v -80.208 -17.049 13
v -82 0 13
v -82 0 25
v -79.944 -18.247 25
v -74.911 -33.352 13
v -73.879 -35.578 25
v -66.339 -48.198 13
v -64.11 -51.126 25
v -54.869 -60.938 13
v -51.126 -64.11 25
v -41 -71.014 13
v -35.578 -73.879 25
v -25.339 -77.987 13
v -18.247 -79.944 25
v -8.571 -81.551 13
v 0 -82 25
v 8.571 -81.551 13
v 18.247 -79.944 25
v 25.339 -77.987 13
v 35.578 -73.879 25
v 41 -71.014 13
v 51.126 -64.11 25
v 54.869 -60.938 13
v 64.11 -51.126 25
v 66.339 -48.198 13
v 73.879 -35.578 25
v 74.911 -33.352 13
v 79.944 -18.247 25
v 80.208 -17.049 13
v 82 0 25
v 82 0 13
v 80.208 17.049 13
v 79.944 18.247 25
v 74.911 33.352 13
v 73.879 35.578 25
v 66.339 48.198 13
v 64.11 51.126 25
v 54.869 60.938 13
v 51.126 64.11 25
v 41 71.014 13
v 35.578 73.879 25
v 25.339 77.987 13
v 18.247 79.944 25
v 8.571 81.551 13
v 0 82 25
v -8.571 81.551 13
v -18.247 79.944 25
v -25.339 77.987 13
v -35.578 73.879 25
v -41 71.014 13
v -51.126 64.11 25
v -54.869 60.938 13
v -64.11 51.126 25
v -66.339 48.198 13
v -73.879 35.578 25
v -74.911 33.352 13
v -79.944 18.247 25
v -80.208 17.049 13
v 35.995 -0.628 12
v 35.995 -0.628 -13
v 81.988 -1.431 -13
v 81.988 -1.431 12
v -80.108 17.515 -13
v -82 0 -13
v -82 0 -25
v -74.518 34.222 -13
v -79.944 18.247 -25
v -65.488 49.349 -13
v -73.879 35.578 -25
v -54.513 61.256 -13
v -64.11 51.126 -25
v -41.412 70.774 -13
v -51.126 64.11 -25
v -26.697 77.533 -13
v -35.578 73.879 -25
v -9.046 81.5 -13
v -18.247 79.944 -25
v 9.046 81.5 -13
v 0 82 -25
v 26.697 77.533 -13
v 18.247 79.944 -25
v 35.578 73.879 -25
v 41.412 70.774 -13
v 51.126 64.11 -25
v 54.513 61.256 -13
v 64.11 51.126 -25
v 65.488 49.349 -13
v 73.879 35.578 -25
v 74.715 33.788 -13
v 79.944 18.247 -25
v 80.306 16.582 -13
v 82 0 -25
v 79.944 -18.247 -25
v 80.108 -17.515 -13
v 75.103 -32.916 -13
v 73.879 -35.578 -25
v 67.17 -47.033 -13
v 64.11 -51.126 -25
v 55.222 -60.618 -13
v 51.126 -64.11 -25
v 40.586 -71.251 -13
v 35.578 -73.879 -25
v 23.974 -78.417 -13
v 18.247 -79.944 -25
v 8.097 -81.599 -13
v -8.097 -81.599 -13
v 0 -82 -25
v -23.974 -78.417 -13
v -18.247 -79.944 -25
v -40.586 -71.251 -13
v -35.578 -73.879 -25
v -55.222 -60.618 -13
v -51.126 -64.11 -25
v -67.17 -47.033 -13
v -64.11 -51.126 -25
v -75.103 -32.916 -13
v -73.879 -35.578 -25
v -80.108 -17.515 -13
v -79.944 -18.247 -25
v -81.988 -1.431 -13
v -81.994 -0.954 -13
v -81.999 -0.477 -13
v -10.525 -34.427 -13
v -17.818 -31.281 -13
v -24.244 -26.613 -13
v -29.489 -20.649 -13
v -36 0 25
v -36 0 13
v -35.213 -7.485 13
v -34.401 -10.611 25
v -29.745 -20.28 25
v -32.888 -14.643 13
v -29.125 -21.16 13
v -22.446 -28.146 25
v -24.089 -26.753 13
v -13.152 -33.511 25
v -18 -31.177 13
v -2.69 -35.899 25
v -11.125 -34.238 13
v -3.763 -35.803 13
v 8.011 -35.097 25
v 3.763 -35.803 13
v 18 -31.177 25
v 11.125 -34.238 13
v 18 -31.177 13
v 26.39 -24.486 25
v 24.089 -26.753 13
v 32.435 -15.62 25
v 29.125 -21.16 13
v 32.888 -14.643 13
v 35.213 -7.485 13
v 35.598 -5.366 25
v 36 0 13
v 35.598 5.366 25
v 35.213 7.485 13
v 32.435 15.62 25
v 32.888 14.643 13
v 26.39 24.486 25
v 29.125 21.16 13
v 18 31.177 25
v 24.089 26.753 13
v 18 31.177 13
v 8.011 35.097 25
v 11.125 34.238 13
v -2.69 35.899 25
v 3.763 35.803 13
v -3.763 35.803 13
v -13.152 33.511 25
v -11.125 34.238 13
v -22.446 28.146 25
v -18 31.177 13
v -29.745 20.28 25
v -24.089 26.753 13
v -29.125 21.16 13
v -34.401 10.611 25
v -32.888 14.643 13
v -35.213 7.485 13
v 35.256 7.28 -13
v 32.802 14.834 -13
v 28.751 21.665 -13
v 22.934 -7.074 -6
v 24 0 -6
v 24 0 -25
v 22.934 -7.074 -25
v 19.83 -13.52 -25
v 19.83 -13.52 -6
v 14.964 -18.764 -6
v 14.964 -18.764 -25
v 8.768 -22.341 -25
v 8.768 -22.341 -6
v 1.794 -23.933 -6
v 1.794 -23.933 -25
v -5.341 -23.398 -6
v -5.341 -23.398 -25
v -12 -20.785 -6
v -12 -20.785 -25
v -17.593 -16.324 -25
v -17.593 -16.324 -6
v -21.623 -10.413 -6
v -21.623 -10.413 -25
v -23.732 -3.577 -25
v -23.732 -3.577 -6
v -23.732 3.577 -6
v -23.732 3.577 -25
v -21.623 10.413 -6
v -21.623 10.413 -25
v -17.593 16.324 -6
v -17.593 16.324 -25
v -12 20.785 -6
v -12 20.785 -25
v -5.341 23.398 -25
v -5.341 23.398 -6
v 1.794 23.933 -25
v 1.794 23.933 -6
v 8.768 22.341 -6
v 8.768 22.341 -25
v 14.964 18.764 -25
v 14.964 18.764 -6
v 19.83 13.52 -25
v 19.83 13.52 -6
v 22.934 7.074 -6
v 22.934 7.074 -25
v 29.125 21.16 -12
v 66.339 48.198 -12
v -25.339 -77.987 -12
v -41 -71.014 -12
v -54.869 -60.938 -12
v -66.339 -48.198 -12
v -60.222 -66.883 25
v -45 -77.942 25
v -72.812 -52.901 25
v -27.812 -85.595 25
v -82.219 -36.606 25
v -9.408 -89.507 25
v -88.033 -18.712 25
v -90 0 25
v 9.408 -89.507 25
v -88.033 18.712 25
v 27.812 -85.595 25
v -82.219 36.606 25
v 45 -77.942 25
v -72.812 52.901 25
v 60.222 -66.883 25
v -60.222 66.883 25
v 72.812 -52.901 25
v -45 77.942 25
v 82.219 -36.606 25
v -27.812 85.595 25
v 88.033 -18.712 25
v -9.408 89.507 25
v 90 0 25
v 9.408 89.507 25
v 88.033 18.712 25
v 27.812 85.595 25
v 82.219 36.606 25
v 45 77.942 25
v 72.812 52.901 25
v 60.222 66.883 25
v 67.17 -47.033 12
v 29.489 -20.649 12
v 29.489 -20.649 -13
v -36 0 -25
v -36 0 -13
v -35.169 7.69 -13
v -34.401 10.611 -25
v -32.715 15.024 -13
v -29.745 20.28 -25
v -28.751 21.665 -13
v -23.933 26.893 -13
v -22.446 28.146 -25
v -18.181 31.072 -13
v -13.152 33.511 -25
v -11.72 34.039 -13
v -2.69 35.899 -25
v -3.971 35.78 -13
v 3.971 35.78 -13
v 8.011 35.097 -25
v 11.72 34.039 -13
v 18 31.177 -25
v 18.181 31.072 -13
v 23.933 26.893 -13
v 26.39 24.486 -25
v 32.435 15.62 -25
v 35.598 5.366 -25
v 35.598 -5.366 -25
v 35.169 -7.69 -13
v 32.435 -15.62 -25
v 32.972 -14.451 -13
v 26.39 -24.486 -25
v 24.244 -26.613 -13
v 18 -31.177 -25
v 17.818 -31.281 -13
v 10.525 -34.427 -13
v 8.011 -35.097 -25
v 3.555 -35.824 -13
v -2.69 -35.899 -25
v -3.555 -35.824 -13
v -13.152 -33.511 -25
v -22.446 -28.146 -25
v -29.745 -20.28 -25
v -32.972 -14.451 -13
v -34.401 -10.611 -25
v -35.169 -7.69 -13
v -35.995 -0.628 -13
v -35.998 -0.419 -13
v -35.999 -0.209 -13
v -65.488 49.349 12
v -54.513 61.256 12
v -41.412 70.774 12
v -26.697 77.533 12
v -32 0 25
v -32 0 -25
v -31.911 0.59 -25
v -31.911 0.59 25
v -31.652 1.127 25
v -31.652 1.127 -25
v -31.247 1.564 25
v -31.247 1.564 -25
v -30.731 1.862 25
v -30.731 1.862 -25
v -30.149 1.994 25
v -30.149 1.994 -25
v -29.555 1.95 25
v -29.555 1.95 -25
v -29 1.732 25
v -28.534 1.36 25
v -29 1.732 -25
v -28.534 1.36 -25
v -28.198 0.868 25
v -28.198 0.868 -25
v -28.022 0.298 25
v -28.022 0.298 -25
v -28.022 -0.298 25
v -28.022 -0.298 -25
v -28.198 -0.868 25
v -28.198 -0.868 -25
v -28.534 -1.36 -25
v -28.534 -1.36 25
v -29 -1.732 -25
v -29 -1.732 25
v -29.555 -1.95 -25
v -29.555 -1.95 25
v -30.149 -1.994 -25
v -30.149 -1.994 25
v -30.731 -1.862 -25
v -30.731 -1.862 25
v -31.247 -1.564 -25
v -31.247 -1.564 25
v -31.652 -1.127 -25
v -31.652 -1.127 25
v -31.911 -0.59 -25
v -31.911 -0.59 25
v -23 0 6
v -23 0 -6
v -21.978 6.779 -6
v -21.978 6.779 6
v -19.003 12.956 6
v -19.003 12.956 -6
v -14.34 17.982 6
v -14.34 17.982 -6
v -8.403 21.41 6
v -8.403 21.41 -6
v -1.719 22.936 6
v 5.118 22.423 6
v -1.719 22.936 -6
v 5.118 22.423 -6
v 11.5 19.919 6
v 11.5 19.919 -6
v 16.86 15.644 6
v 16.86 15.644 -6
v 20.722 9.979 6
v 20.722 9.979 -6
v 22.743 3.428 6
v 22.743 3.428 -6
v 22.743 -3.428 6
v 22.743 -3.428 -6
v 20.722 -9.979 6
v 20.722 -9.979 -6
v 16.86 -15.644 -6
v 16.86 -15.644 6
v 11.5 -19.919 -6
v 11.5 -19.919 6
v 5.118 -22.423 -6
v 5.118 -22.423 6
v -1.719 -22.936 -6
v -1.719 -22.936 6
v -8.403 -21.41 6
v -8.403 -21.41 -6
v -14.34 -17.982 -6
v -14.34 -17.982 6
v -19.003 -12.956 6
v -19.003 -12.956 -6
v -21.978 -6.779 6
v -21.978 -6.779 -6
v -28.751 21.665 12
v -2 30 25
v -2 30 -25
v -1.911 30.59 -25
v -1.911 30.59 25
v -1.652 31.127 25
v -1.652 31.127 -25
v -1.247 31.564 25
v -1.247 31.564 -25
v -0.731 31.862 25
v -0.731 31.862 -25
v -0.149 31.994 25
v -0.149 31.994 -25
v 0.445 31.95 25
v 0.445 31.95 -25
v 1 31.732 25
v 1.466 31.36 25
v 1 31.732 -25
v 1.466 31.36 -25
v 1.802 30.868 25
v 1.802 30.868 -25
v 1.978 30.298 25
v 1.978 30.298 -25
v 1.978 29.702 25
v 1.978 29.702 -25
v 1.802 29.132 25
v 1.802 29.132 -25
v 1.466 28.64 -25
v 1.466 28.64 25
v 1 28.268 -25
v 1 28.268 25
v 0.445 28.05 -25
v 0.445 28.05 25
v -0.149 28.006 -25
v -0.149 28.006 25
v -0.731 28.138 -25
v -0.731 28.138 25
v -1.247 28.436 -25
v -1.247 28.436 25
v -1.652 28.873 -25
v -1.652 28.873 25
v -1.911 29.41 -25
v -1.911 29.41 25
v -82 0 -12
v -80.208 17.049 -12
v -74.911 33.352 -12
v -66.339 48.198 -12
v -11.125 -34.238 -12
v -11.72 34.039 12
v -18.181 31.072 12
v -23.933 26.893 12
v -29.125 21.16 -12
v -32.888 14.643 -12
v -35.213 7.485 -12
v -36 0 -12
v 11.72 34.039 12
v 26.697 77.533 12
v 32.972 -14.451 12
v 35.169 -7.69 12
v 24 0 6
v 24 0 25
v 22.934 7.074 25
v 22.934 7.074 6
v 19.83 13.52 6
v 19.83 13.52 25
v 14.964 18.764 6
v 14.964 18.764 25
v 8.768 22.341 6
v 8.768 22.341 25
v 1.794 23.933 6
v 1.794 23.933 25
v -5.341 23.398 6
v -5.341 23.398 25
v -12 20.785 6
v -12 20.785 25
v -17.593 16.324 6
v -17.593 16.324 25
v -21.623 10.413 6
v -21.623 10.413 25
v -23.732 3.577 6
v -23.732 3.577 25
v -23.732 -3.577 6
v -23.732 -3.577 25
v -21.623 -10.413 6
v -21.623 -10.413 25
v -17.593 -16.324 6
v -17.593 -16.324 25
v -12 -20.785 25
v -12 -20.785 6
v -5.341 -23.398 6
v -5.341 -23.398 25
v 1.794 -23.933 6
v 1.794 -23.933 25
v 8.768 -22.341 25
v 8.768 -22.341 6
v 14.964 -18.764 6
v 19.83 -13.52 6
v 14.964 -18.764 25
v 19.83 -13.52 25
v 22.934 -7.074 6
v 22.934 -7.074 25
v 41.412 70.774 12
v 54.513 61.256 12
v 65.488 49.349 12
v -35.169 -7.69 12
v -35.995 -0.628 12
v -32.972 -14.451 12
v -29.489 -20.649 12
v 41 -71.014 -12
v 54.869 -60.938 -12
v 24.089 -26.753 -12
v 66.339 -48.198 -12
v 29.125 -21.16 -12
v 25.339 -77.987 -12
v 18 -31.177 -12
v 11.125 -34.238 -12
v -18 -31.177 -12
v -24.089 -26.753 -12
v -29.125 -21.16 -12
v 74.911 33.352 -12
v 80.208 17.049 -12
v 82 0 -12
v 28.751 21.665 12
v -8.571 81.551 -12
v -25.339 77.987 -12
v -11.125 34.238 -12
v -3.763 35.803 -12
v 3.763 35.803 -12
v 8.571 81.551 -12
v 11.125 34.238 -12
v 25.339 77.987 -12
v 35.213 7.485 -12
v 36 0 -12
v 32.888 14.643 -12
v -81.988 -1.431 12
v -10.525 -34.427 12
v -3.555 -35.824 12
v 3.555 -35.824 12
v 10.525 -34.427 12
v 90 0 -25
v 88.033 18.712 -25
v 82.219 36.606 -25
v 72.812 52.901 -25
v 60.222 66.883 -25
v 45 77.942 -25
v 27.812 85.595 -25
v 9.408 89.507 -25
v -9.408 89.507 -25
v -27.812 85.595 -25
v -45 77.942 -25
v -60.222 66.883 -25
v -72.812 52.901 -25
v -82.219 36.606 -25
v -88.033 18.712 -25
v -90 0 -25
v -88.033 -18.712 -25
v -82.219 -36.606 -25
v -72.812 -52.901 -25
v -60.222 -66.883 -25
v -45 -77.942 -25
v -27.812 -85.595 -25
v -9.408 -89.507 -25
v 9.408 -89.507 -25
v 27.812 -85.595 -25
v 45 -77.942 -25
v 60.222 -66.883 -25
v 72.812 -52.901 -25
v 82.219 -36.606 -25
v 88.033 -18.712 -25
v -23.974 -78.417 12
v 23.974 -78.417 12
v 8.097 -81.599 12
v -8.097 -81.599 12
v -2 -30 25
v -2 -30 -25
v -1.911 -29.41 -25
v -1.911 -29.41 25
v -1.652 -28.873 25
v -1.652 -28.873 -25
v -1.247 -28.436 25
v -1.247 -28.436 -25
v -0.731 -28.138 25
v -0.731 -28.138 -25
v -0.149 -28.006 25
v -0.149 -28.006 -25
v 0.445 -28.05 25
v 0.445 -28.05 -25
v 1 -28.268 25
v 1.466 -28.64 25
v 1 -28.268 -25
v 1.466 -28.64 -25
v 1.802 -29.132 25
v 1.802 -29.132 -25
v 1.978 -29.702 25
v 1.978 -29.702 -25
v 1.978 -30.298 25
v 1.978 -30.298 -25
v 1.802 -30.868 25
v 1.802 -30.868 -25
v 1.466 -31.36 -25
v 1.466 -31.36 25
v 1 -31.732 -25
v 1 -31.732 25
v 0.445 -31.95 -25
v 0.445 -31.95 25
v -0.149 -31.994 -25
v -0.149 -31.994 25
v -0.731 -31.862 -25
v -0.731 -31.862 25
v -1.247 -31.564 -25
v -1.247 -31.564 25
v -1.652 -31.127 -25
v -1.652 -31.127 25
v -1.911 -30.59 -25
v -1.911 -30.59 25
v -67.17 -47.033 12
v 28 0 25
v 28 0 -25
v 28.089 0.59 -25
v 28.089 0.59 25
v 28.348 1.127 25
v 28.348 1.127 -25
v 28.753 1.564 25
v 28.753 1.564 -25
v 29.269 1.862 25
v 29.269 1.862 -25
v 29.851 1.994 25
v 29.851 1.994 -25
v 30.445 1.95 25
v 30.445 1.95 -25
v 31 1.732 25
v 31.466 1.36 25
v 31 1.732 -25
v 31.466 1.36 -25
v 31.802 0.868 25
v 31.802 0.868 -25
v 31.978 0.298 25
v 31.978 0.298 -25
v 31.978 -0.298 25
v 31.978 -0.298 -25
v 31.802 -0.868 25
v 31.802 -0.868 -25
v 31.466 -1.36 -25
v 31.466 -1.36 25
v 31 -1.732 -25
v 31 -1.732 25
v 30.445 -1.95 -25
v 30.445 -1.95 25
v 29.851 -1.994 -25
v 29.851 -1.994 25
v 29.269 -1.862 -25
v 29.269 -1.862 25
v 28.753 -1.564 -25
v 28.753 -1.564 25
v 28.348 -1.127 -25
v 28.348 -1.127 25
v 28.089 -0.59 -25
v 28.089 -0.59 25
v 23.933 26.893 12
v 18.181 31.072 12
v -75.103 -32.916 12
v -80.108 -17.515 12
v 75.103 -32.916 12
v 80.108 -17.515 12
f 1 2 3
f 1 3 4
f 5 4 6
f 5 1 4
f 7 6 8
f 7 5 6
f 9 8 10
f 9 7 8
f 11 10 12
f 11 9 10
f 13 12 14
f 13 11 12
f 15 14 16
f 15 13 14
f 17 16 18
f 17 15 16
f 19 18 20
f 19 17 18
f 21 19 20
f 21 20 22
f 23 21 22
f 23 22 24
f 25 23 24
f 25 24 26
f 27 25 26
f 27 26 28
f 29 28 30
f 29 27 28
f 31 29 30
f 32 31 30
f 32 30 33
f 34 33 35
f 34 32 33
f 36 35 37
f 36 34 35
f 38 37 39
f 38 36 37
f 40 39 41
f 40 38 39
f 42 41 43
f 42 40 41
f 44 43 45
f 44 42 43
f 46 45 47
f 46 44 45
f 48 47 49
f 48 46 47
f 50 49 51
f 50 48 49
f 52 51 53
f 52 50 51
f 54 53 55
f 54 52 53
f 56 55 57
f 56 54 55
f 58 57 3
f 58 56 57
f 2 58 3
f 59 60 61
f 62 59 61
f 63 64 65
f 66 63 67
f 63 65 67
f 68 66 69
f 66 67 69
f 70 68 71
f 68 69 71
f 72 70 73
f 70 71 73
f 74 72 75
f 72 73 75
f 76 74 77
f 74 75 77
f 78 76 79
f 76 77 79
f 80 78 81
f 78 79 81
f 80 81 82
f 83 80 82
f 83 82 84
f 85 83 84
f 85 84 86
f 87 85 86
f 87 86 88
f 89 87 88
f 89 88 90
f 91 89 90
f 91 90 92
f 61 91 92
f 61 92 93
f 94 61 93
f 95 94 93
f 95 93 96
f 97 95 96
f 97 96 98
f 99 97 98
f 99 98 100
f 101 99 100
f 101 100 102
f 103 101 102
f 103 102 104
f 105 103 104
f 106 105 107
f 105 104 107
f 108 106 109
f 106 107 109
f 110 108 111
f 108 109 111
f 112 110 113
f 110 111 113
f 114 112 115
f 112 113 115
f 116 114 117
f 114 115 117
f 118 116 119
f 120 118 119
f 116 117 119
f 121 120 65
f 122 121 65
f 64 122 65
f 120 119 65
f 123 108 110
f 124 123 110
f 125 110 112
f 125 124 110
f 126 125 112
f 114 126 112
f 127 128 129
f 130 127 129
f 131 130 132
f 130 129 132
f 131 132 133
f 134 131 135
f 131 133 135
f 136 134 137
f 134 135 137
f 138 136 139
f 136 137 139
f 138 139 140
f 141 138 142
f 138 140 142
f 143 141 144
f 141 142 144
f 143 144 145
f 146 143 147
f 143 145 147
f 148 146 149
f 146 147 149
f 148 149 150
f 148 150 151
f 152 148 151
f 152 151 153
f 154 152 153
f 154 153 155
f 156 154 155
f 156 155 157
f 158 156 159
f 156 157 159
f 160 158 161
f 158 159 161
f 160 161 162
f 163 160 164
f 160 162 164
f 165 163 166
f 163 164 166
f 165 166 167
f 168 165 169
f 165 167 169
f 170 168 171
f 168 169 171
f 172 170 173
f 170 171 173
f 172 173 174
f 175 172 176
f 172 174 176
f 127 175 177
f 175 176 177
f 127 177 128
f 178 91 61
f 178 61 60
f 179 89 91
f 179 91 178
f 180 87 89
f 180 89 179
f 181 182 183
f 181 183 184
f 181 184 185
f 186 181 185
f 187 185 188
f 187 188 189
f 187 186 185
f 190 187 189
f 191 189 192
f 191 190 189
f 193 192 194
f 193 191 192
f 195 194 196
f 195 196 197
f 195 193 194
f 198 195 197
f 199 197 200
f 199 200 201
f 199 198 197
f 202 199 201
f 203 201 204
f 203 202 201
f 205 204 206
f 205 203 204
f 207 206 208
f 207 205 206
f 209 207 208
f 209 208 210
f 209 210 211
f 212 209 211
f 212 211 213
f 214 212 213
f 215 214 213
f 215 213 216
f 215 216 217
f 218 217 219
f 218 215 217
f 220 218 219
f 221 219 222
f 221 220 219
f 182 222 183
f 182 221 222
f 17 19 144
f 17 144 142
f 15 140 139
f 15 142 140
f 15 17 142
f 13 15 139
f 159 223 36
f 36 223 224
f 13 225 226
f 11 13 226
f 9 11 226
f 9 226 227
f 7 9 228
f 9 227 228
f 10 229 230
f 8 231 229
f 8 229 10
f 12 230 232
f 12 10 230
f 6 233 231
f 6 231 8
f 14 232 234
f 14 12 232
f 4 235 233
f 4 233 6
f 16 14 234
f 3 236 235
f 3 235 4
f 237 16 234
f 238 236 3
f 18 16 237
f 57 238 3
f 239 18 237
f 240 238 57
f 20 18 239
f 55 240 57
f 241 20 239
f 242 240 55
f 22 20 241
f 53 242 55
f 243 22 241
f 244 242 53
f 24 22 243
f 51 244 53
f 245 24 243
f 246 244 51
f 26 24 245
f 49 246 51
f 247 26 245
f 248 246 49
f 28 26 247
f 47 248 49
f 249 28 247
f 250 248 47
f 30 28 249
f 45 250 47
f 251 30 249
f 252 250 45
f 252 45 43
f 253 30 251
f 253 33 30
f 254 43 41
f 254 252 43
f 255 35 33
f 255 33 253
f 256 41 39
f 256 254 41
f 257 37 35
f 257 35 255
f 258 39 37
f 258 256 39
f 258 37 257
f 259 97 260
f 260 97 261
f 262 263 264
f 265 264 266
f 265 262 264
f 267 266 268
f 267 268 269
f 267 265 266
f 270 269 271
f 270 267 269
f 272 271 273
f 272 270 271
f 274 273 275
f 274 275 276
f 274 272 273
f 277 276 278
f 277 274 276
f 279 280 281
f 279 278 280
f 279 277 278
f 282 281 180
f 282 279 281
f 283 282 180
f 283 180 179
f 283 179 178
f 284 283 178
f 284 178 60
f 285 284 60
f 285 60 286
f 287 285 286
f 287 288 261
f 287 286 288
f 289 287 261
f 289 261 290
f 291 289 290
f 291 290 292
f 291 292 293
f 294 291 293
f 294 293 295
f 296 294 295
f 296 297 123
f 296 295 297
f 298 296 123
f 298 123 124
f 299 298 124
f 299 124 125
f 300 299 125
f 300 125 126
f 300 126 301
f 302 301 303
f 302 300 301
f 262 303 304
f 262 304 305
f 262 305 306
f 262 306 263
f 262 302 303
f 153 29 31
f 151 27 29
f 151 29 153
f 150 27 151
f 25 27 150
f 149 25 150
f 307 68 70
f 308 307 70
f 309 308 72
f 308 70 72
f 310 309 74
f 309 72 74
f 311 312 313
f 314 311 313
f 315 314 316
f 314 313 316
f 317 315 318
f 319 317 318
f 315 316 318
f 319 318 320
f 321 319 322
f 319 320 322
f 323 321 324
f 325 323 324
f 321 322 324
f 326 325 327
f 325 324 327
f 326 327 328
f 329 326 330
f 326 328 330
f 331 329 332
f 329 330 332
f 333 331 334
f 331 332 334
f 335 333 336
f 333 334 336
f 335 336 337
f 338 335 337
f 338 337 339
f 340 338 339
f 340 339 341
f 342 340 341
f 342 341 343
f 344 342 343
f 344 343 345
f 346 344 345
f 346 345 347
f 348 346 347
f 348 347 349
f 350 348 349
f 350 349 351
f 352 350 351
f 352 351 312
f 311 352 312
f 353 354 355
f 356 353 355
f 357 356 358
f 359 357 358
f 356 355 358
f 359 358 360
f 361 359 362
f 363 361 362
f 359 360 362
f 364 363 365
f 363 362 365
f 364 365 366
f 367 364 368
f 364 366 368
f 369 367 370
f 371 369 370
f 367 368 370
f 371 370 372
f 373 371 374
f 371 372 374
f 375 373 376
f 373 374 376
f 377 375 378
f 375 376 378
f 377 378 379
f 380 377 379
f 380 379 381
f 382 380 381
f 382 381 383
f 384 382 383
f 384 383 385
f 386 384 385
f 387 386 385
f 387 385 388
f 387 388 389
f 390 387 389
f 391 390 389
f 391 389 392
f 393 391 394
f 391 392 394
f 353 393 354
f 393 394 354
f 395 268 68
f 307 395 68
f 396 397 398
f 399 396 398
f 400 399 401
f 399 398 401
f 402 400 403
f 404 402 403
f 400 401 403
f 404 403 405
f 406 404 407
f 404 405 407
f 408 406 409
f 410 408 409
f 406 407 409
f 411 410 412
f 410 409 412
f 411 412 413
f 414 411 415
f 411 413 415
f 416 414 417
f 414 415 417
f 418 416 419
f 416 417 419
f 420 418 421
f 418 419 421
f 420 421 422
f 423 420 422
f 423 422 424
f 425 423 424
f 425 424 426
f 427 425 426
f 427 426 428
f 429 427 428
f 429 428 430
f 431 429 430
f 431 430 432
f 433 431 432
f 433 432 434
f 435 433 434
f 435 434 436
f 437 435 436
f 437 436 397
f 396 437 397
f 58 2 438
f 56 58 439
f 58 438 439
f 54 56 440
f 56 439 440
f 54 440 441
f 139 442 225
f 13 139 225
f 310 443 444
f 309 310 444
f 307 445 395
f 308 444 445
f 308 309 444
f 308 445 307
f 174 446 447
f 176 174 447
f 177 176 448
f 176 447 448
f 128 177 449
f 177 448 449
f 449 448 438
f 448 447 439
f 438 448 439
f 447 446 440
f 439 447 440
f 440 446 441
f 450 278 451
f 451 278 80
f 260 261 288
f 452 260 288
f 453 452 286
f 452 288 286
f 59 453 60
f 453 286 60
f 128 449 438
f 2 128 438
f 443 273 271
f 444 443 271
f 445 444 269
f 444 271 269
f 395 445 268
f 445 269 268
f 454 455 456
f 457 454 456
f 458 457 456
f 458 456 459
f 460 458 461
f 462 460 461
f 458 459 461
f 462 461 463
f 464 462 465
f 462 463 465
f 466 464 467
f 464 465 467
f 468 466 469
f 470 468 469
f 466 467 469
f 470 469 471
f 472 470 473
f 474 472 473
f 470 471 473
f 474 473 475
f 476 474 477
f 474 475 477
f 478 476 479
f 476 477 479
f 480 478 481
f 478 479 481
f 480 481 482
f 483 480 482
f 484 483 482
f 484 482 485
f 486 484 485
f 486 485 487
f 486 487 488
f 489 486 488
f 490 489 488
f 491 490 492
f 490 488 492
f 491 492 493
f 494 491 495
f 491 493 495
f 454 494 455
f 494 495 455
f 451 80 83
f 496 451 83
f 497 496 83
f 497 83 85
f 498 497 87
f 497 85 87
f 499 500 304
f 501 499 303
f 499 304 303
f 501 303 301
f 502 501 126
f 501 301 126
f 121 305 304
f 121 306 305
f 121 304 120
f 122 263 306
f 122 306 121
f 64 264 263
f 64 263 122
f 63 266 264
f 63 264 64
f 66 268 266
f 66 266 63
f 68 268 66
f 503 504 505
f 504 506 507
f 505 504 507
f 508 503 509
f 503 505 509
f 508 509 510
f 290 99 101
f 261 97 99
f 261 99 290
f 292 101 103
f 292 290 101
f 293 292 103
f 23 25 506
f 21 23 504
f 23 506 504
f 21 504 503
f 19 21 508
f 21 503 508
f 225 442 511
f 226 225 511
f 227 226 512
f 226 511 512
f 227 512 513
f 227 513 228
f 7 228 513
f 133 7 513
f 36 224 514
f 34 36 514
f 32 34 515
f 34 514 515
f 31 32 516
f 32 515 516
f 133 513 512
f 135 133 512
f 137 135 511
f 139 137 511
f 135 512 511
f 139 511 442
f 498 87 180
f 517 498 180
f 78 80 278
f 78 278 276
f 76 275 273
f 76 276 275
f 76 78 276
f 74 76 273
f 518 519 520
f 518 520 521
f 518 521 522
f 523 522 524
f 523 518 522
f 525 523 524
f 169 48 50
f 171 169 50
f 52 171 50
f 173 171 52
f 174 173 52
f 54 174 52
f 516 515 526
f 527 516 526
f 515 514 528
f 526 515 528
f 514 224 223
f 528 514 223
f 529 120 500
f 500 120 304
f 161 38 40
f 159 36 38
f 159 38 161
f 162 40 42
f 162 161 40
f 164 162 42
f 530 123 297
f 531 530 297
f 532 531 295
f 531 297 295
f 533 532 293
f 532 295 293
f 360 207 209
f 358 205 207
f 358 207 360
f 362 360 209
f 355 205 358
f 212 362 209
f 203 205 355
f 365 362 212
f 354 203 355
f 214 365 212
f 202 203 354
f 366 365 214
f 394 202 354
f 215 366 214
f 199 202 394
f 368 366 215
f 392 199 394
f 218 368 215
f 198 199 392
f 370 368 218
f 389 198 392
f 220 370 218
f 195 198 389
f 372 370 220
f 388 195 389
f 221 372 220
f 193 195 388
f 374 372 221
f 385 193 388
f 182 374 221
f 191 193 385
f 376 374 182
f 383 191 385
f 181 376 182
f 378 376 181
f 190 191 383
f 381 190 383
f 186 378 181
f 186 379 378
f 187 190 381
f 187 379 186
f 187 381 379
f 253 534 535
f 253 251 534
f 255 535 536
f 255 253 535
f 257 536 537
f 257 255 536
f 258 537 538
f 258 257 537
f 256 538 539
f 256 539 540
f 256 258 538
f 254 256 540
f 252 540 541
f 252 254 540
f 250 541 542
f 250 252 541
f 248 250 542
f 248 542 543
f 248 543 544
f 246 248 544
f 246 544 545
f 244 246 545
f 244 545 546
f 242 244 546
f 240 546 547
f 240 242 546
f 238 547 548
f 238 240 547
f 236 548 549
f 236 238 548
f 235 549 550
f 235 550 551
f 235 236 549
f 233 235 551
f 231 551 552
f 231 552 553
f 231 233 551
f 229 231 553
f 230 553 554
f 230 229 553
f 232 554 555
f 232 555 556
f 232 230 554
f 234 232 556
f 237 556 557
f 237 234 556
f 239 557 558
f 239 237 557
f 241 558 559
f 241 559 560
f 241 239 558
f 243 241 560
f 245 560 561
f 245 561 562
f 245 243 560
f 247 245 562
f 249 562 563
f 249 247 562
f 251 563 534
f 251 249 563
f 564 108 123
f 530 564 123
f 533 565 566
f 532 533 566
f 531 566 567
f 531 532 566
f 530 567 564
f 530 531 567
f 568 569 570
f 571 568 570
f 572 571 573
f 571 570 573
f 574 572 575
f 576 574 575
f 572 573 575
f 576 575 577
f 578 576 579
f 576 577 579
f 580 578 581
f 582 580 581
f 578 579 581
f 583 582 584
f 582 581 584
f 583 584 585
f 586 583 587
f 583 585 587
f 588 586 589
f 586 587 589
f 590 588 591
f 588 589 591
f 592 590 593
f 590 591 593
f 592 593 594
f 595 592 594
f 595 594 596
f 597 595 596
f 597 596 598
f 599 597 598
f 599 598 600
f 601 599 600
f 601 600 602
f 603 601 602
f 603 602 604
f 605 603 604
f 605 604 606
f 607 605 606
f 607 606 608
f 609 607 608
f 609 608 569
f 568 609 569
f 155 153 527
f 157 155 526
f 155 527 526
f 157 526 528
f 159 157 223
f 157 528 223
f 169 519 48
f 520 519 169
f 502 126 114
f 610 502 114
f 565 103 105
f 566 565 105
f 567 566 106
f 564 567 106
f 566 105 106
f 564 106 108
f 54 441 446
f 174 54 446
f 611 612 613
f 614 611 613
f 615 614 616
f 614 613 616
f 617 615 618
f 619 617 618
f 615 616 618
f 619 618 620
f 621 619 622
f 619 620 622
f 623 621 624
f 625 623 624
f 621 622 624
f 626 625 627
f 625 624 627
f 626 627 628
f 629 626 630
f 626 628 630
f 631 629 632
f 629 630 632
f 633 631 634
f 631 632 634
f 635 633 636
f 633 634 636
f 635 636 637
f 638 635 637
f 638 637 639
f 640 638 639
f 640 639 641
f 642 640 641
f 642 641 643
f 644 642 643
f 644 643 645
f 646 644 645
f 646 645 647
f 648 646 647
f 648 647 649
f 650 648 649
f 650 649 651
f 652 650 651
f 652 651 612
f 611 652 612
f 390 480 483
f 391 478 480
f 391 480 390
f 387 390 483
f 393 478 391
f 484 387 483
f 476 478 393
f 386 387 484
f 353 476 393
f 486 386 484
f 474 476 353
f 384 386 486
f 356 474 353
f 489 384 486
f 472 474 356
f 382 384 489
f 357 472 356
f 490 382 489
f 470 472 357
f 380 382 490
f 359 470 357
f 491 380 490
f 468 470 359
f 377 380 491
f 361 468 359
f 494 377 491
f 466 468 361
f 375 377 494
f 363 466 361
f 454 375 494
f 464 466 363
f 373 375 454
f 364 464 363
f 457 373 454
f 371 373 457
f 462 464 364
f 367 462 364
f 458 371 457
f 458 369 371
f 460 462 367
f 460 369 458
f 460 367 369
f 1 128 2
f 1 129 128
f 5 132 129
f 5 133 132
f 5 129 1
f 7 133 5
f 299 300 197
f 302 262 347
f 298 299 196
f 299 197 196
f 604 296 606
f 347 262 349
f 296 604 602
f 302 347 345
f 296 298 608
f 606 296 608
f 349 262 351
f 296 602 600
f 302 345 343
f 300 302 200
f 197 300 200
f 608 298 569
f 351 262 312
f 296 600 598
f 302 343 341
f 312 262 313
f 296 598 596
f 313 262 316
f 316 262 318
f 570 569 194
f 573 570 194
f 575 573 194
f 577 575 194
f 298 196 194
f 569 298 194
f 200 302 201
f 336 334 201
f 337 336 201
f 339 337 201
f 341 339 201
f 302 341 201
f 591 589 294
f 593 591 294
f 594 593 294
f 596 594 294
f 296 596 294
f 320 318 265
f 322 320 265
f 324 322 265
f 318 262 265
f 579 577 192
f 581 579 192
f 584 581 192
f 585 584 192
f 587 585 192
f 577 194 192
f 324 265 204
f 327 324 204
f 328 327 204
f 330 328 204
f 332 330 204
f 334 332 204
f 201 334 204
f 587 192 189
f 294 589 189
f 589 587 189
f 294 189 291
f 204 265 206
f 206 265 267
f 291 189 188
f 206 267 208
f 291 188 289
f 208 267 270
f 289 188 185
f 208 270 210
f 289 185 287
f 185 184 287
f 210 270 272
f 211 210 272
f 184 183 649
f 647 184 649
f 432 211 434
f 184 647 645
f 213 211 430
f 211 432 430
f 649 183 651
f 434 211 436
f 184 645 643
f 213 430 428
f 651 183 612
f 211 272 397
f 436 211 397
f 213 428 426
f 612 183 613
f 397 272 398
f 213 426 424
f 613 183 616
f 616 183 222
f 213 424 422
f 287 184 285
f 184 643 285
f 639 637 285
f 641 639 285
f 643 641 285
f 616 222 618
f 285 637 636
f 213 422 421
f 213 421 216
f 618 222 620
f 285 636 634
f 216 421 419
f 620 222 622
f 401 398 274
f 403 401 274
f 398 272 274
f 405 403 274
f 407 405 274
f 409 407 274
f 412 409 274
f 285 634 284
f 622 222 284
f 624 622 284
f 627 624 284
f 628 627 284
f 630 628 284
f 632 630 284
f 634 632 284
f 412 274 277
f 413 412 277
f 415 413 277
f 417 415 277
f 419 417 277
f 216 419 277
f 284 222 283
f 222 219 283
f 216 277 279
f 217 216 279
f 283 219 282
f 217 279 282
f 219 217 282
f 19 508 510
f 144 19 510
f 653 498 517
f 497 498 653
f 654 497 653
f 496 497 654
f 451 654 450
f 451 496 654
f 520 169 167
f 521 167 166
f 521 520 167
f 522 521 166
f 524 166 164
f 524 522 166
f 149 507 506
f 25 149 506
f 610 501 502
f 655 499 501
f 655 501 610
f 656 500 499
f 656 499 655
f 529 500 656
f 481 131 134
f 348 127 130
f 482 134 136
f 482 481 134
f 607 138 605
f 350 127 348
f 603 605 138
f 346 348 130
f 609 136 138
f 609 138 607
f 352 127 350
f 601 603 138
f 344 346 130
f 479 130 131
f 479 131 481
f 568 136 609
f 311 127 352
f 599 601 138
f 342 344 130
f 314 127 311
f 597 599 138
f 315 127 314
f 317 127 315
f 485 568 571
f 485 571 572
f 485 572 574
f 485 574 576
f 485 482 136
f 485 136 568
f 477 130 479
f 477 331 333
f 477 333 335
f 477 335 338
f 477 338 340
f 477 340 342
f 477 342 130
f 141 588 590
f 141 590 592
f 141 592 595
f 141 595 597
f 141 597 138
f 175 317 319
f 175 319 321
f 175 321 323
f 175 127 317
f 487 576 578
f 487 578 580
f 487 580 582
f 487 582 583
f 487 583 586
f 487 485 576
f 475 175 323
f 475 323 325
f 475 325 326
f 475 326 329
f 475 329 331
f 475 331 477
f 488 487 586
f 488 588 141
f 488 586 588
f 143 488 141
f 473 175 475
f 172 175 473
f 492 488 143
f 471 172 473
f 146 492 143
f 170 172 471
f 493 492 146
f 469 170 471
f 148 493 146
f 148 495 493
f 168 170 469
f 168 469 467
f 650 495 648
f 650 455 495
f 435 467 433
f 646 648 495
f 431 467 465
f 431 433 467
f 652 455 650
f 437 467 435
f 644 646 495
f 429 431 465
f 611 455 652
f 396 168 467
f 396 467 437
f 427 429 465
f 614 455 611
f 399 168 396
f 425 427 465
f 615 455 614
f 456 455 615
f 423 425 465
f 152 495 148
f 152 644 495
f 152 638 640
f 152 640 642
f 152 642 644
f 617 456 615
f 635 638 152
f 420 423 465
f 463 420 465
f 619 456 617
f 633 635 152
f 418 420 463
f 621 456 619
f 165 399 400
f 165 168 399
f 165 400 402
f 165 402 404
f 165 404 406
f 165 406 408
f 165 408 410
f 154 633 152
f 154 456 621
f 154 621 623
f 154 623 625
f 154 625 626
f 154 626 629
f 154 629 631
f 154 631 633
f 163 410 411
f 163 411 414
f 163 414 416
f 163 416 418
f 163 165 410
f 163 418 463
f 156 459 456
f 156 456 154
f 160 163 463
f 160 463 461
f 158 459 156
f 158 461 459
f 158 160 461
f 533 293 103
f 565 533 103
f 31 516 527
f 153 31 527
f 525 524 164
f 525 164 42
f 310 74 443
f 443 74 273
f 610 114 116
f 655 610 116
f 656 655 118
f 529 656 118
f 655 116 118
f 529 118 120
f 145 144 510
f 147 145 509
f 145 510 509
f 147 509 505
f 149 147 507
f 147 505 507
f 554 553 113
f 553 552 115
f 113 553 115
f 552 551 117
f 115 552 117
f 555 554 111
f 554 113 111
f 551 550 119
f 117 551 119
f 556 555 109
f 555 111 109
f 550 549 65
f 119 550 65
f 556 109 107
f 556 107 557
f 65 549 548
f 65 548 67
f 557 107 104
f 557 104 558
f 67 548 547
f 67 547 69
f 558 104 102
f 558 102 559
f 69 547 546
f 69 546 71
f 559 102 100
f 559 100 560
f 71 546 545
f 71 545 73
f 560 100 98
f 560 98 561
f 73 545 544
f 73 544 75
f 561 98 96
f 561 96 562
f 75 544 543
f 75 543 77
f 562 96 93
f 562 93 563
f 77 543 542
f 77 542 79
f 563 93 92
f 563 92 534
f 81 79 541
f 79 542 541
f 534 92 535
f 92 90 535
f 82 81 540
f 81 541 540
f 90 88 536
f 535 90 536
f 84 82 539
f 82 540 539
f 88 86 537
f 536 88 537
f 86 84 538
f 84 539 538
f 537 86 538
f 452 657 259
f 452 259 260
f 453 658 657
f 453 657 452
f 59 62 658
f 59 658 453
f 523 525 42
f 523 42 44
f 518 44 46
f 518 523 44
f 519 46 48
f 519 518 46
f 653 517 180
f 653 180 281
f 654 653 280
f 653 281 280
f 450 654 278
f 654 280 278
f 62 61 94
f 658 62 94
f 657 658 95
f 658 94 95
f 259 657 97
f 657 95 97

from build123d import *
from build123d.topology import SkipClean

# Parameters (mm, degrees)
SKETCH1_R           = 90
BOSS_EXTRUDE1_DEPTH = 25
SKETCH3_R           = 24
CUT_EXTRUDE2_DEPTH  = 19
CUT_EXTRUDE3_START  = -19
SKETCH4_R           = 24
CUT_EXTRUDE3_DEPTH  = 19
SKETCH5_R           = 23
CUT_EXTRUDE4_DEPTH  = 12
SKETCH6_R           = 82
SKETCH6_R_2         = 36
CUT_EXTRUDE7_DEPTH  = 12
CUT_EXTRUDE8_START  = -12
SKETCH8_R           = 82
SKETCH8_R_2         = 36
CUT_EXTRUDE8_DEPTH  = 12
CUT_EXTRUDE10_START = -25
CUT_EXTRUDE10_DEPTH = 25
CUT_EXTRUDE11_DEPTH = 25
SKETCH13_R          = 2
CUT_EXTRUDE12_DEPTH = 137.747943312


with BuildPart() as part:
    # Sketch1 → Boss-Extrude1 (new, symmetric)
    with BuildSketch(Plane.XY):
        Circle(SKETCH1_R)
    extrude(amount=BOSS_EXTRUDE1_DEPTH, both=True)

    # Sketch3 → Cut-Extrude2 (cut)
    with BuildSketch(Plane.XY.offset(25)):
        Circle(SKETCH3_R)
    extrude(amount=-CUT_EXTRUDE2_DEPTH, mode=Mode.SUBTRACT)

    # Sketch4 → Cut-Extrude3 (cut)
    with BuildSketch(Plane(origin=(0, 0, -25), x_dir=(-1, 0, 0), z_dir=(0, 0, -1)).offset(CUT_EXTRUDE3_START)):
        with Locations(Location((0, 0, 0), (0, 0, 180))):
            Circle(SKETCH4_R)
    extrude(amount=CUT_EXTRUDE3_DEPTH, mode=Mode.SUBTRACT)

    # Sketch5 → Cut-Extrude4 (cut)
    with BuildSketch(Plane(origin=(0, 0, -6), x_dir=(-1, 0, 0), z_dir=(0, 0, -1))):
        Circle(SKETCH5_R)
    extrude(amount=-CUT_EXTRUDE4_DEPTH, mode=Mode.SUBTRACT)

    # Sketch6 → Cut-Extrude7 (cut)
    with BuildSketch(Plane(origin=(0, 0, -25), x_dir=(-1, 0, 0), z_dir=(0, 0, -1))):
        Circle(SKETCH6_R)
        Circle(SKETCH6_R_2, mode=Mode.SUBTRACT)
    extrude(amount=-CUT_EXTRUDE7_DEPTH, mode=Mode.SUBTRACT)

    # Sketch8 → Cut-Extrude8 (cut)
    with BuildSketch(Plane.XY.offset(25).offset(CUT_EXTRUDE8_START)):
        with Locations(Location((0, 0, 0), (0, 0, 180))):
            Circle(SKETCH8_R)
        with Locations(Location((0, 0, 0), (0, 0, 180))):
            Circle(SKETCH8_R_2, mode=Mode.SUBTRACT)
    extrude(amount=CUT_EXTRUDE8_DEPTH, mode=Mode.SUBTRACT)

    # Sketch11 → Cut-Extrude10 (cut)
    with SkipClean():  # the faces are left unmerged after this step: merging them gives an invalid solid
        with BuildSketch(Plane.XY.offset(13).offset(CUT_EXTRUDE10_START)):
            with BuildLine():
                Line((11.124611797, 34.238034587), (25.339393539, 77.986634336))
                ThreePointArc((25.339393539, 77.986634336), (0, 82), (-25.339393539, 77.986634336))
                Line((-25.339393539, 77.986634336), (-11.124611798, 34.238034587))
                ThreePointArc((-11.124611798, 34.238034587), (0, 36), (11.124611797, 34.238034587))
            make_face()
            with BuildLine():
                Line((29.124611798, 21.160269083), (66.339393539, 48.198390688))
                ThreePointArc((66.339393539, 48.198390688), (77.986634336, 25.339393539), (82, 0))
                Line((82, 0), (36, 0))
                ThreePointArc((36, 0), (34.238034587, 11.124611797), (29.124611798, 21.160269083))
            make_face()
            with BuildLine():
                Line((29.124611798, -21.160269083), (66.339393539, -48.198390688))
                ThreePointArc((66.339393539, -48.198390688), (48.198390688, -66.339393539), (25.339393539, -77.986634336))
                Line((25.339393539, -77.986634336), (11.124611797, -34.238034587))
                ThreePointArc((11.124611797, -34.238034587), (21.160269083, -29.124611798), (29.124611798, -21.160269083))
            make_face()
            with BuildLine():
                Line((-11.124611797, -34.238034587), (-25.339393539, -77.986634336))
                ThreePointArc((-25.339393539, -77.986634336), (-48.198390688, -66.339393539), (-66.339393539, -48.198390688))
                Line((-66.339393539, -48.198390688), (-29.124611798, -21.160269083))
                ThreePointArc((-29.124611798, -21.160269083), (-21.160269083, -29.124611798), (-11.124611797, -34.238034587))
            make_face()
            with BuildLine():
                Line((-36, 0), (-82, 0))
                ThreePointArc((-82, 0), (-77.986634336, 25.339393539), (-66.339393539, 48.198390688))
                Line((-66.339393539, 48.198390688), (-29.124611798, 21.160269083))
                ThreePointArc((-29.124611798, 21.160269083), (-34.238034587, 11.124611797), (-36, 0))
            make_face()
        extrude(amount=CUT_EXTRUDE10_DEPTH, mode=Mode.SUBTRACT)

    # Sketch12 → Cut-Extrude11 (cut)
    with SkipClean():  # the faces are left unmerged after this step: merging them gives an invalid solid
        with BuildSketch(Plane(origin=(0, 0, -13), x_dir=(-1, 0, 0), z_dir=(0, 0, -1))):
            with BuildLine():
                ThreePointArc((-28.750878362, 21.665340833), (-21.160269083, 29.124611797), (-11.72045356, 34.038668722))
                Line((-11.72045356, 34.038668722), (-26.696588665, 77.532523199))
                ThreePointArc((-26.696588665, 77.532523199), (-48.198390688, 66.339393539), (-65.488111824, 49.348831898))
                Line((-65.488111824, 49.348831898), (-28.750878362, 21.665340833))
            make_face()
            with BuildLine():
                Line((26.696588665, 77.532523199), (11.72045356, 34.038668722))
                ThreePointArc((11.72045356, 34.038668722), (21.160269083, 29.124611797), (28.750878362, 21.665340833))
                Line((28.750878362, 21.665340833), (65.488111824, 49.348831898))
                ThreePointArc((65.488111824, 49.348831898), (48.198390688, 66.339393539), (26.696588665, 77.532523199))
            make_face()
            with BuildLine():
                Line((81.987511003, -1.431097328), (35.994517026, -0.628286632))
                ThreePointArc((35.994517026, -0.628286632), (34.238034587, -11.124611797), (29.489473594, -20.648751709))
                Line((29.489473594, -20.648751709), (67.170467632, -47.033267781))
                ThreePointArc((67.170467632, -47.033267781), (77.986634336, -25.339393539), (81.987511003, -1.431097328))
            make_face()
            with BuildLine():
                ThreePointArc((-29.489473594, -20.648751709), (-34.238034587, -11.124611797), (-35.994517026, -0.628286632))
                Line((-35.994517026, -0.628286632), (-81.987511003, -1.431097328))
                ThreePointArc((-81.987511003, -1.431097328), (-77.986634336, -25.339393539), (-67.170467632, -47.033267781))
                Line((-67.170467632, -47.033267781), (-29.489473594, -20.648751709))
            make_face()
            with BuildLine():
                Line((23.974479787, -78.416989989), (10.52538137, -34.426971215))
                ThreePointArc((10.52538137, -34.426971215), (0, -36), (-10.52538137, -34.426971215))
                Line((-10.52538137, -34.426971215), (-23.974479787, -78.416989989))
                ThreePointArc((-23.974479787, -78.416989989), (0, -82), (23.974479787, -78.416989989))
            make_face()
        extrude(amount=-CUT_EXTRUDE11_DEPTH, mode=Mode.SUBTRACT)

    # Sketch13 → Cut-Extrude12 (cut, through all)
    with SkipClean():  # the faces are left unmerged after this step: merging them gives an invalid solid
        with BuildSketch(Plane(origin=(0, 0, -25), x_dir=(-1, 0, 0), z_dir=(0, 0, -1))):
            with Locations((0, 30)):
                Circle(SKETCH13_R)
            with Locations((30, 0)):
                Circle(SKETCH13_R)
            with Locations((0, -30)):
                Circle(SKETCH13_R)
            with Locations((-30, 0)):
                Circle(SKETCH13_R)
        extrude(amount=-CUT_EXTRUDE12_DEPTH, mode=Mode.SUBTRACT)


solid = part.part
